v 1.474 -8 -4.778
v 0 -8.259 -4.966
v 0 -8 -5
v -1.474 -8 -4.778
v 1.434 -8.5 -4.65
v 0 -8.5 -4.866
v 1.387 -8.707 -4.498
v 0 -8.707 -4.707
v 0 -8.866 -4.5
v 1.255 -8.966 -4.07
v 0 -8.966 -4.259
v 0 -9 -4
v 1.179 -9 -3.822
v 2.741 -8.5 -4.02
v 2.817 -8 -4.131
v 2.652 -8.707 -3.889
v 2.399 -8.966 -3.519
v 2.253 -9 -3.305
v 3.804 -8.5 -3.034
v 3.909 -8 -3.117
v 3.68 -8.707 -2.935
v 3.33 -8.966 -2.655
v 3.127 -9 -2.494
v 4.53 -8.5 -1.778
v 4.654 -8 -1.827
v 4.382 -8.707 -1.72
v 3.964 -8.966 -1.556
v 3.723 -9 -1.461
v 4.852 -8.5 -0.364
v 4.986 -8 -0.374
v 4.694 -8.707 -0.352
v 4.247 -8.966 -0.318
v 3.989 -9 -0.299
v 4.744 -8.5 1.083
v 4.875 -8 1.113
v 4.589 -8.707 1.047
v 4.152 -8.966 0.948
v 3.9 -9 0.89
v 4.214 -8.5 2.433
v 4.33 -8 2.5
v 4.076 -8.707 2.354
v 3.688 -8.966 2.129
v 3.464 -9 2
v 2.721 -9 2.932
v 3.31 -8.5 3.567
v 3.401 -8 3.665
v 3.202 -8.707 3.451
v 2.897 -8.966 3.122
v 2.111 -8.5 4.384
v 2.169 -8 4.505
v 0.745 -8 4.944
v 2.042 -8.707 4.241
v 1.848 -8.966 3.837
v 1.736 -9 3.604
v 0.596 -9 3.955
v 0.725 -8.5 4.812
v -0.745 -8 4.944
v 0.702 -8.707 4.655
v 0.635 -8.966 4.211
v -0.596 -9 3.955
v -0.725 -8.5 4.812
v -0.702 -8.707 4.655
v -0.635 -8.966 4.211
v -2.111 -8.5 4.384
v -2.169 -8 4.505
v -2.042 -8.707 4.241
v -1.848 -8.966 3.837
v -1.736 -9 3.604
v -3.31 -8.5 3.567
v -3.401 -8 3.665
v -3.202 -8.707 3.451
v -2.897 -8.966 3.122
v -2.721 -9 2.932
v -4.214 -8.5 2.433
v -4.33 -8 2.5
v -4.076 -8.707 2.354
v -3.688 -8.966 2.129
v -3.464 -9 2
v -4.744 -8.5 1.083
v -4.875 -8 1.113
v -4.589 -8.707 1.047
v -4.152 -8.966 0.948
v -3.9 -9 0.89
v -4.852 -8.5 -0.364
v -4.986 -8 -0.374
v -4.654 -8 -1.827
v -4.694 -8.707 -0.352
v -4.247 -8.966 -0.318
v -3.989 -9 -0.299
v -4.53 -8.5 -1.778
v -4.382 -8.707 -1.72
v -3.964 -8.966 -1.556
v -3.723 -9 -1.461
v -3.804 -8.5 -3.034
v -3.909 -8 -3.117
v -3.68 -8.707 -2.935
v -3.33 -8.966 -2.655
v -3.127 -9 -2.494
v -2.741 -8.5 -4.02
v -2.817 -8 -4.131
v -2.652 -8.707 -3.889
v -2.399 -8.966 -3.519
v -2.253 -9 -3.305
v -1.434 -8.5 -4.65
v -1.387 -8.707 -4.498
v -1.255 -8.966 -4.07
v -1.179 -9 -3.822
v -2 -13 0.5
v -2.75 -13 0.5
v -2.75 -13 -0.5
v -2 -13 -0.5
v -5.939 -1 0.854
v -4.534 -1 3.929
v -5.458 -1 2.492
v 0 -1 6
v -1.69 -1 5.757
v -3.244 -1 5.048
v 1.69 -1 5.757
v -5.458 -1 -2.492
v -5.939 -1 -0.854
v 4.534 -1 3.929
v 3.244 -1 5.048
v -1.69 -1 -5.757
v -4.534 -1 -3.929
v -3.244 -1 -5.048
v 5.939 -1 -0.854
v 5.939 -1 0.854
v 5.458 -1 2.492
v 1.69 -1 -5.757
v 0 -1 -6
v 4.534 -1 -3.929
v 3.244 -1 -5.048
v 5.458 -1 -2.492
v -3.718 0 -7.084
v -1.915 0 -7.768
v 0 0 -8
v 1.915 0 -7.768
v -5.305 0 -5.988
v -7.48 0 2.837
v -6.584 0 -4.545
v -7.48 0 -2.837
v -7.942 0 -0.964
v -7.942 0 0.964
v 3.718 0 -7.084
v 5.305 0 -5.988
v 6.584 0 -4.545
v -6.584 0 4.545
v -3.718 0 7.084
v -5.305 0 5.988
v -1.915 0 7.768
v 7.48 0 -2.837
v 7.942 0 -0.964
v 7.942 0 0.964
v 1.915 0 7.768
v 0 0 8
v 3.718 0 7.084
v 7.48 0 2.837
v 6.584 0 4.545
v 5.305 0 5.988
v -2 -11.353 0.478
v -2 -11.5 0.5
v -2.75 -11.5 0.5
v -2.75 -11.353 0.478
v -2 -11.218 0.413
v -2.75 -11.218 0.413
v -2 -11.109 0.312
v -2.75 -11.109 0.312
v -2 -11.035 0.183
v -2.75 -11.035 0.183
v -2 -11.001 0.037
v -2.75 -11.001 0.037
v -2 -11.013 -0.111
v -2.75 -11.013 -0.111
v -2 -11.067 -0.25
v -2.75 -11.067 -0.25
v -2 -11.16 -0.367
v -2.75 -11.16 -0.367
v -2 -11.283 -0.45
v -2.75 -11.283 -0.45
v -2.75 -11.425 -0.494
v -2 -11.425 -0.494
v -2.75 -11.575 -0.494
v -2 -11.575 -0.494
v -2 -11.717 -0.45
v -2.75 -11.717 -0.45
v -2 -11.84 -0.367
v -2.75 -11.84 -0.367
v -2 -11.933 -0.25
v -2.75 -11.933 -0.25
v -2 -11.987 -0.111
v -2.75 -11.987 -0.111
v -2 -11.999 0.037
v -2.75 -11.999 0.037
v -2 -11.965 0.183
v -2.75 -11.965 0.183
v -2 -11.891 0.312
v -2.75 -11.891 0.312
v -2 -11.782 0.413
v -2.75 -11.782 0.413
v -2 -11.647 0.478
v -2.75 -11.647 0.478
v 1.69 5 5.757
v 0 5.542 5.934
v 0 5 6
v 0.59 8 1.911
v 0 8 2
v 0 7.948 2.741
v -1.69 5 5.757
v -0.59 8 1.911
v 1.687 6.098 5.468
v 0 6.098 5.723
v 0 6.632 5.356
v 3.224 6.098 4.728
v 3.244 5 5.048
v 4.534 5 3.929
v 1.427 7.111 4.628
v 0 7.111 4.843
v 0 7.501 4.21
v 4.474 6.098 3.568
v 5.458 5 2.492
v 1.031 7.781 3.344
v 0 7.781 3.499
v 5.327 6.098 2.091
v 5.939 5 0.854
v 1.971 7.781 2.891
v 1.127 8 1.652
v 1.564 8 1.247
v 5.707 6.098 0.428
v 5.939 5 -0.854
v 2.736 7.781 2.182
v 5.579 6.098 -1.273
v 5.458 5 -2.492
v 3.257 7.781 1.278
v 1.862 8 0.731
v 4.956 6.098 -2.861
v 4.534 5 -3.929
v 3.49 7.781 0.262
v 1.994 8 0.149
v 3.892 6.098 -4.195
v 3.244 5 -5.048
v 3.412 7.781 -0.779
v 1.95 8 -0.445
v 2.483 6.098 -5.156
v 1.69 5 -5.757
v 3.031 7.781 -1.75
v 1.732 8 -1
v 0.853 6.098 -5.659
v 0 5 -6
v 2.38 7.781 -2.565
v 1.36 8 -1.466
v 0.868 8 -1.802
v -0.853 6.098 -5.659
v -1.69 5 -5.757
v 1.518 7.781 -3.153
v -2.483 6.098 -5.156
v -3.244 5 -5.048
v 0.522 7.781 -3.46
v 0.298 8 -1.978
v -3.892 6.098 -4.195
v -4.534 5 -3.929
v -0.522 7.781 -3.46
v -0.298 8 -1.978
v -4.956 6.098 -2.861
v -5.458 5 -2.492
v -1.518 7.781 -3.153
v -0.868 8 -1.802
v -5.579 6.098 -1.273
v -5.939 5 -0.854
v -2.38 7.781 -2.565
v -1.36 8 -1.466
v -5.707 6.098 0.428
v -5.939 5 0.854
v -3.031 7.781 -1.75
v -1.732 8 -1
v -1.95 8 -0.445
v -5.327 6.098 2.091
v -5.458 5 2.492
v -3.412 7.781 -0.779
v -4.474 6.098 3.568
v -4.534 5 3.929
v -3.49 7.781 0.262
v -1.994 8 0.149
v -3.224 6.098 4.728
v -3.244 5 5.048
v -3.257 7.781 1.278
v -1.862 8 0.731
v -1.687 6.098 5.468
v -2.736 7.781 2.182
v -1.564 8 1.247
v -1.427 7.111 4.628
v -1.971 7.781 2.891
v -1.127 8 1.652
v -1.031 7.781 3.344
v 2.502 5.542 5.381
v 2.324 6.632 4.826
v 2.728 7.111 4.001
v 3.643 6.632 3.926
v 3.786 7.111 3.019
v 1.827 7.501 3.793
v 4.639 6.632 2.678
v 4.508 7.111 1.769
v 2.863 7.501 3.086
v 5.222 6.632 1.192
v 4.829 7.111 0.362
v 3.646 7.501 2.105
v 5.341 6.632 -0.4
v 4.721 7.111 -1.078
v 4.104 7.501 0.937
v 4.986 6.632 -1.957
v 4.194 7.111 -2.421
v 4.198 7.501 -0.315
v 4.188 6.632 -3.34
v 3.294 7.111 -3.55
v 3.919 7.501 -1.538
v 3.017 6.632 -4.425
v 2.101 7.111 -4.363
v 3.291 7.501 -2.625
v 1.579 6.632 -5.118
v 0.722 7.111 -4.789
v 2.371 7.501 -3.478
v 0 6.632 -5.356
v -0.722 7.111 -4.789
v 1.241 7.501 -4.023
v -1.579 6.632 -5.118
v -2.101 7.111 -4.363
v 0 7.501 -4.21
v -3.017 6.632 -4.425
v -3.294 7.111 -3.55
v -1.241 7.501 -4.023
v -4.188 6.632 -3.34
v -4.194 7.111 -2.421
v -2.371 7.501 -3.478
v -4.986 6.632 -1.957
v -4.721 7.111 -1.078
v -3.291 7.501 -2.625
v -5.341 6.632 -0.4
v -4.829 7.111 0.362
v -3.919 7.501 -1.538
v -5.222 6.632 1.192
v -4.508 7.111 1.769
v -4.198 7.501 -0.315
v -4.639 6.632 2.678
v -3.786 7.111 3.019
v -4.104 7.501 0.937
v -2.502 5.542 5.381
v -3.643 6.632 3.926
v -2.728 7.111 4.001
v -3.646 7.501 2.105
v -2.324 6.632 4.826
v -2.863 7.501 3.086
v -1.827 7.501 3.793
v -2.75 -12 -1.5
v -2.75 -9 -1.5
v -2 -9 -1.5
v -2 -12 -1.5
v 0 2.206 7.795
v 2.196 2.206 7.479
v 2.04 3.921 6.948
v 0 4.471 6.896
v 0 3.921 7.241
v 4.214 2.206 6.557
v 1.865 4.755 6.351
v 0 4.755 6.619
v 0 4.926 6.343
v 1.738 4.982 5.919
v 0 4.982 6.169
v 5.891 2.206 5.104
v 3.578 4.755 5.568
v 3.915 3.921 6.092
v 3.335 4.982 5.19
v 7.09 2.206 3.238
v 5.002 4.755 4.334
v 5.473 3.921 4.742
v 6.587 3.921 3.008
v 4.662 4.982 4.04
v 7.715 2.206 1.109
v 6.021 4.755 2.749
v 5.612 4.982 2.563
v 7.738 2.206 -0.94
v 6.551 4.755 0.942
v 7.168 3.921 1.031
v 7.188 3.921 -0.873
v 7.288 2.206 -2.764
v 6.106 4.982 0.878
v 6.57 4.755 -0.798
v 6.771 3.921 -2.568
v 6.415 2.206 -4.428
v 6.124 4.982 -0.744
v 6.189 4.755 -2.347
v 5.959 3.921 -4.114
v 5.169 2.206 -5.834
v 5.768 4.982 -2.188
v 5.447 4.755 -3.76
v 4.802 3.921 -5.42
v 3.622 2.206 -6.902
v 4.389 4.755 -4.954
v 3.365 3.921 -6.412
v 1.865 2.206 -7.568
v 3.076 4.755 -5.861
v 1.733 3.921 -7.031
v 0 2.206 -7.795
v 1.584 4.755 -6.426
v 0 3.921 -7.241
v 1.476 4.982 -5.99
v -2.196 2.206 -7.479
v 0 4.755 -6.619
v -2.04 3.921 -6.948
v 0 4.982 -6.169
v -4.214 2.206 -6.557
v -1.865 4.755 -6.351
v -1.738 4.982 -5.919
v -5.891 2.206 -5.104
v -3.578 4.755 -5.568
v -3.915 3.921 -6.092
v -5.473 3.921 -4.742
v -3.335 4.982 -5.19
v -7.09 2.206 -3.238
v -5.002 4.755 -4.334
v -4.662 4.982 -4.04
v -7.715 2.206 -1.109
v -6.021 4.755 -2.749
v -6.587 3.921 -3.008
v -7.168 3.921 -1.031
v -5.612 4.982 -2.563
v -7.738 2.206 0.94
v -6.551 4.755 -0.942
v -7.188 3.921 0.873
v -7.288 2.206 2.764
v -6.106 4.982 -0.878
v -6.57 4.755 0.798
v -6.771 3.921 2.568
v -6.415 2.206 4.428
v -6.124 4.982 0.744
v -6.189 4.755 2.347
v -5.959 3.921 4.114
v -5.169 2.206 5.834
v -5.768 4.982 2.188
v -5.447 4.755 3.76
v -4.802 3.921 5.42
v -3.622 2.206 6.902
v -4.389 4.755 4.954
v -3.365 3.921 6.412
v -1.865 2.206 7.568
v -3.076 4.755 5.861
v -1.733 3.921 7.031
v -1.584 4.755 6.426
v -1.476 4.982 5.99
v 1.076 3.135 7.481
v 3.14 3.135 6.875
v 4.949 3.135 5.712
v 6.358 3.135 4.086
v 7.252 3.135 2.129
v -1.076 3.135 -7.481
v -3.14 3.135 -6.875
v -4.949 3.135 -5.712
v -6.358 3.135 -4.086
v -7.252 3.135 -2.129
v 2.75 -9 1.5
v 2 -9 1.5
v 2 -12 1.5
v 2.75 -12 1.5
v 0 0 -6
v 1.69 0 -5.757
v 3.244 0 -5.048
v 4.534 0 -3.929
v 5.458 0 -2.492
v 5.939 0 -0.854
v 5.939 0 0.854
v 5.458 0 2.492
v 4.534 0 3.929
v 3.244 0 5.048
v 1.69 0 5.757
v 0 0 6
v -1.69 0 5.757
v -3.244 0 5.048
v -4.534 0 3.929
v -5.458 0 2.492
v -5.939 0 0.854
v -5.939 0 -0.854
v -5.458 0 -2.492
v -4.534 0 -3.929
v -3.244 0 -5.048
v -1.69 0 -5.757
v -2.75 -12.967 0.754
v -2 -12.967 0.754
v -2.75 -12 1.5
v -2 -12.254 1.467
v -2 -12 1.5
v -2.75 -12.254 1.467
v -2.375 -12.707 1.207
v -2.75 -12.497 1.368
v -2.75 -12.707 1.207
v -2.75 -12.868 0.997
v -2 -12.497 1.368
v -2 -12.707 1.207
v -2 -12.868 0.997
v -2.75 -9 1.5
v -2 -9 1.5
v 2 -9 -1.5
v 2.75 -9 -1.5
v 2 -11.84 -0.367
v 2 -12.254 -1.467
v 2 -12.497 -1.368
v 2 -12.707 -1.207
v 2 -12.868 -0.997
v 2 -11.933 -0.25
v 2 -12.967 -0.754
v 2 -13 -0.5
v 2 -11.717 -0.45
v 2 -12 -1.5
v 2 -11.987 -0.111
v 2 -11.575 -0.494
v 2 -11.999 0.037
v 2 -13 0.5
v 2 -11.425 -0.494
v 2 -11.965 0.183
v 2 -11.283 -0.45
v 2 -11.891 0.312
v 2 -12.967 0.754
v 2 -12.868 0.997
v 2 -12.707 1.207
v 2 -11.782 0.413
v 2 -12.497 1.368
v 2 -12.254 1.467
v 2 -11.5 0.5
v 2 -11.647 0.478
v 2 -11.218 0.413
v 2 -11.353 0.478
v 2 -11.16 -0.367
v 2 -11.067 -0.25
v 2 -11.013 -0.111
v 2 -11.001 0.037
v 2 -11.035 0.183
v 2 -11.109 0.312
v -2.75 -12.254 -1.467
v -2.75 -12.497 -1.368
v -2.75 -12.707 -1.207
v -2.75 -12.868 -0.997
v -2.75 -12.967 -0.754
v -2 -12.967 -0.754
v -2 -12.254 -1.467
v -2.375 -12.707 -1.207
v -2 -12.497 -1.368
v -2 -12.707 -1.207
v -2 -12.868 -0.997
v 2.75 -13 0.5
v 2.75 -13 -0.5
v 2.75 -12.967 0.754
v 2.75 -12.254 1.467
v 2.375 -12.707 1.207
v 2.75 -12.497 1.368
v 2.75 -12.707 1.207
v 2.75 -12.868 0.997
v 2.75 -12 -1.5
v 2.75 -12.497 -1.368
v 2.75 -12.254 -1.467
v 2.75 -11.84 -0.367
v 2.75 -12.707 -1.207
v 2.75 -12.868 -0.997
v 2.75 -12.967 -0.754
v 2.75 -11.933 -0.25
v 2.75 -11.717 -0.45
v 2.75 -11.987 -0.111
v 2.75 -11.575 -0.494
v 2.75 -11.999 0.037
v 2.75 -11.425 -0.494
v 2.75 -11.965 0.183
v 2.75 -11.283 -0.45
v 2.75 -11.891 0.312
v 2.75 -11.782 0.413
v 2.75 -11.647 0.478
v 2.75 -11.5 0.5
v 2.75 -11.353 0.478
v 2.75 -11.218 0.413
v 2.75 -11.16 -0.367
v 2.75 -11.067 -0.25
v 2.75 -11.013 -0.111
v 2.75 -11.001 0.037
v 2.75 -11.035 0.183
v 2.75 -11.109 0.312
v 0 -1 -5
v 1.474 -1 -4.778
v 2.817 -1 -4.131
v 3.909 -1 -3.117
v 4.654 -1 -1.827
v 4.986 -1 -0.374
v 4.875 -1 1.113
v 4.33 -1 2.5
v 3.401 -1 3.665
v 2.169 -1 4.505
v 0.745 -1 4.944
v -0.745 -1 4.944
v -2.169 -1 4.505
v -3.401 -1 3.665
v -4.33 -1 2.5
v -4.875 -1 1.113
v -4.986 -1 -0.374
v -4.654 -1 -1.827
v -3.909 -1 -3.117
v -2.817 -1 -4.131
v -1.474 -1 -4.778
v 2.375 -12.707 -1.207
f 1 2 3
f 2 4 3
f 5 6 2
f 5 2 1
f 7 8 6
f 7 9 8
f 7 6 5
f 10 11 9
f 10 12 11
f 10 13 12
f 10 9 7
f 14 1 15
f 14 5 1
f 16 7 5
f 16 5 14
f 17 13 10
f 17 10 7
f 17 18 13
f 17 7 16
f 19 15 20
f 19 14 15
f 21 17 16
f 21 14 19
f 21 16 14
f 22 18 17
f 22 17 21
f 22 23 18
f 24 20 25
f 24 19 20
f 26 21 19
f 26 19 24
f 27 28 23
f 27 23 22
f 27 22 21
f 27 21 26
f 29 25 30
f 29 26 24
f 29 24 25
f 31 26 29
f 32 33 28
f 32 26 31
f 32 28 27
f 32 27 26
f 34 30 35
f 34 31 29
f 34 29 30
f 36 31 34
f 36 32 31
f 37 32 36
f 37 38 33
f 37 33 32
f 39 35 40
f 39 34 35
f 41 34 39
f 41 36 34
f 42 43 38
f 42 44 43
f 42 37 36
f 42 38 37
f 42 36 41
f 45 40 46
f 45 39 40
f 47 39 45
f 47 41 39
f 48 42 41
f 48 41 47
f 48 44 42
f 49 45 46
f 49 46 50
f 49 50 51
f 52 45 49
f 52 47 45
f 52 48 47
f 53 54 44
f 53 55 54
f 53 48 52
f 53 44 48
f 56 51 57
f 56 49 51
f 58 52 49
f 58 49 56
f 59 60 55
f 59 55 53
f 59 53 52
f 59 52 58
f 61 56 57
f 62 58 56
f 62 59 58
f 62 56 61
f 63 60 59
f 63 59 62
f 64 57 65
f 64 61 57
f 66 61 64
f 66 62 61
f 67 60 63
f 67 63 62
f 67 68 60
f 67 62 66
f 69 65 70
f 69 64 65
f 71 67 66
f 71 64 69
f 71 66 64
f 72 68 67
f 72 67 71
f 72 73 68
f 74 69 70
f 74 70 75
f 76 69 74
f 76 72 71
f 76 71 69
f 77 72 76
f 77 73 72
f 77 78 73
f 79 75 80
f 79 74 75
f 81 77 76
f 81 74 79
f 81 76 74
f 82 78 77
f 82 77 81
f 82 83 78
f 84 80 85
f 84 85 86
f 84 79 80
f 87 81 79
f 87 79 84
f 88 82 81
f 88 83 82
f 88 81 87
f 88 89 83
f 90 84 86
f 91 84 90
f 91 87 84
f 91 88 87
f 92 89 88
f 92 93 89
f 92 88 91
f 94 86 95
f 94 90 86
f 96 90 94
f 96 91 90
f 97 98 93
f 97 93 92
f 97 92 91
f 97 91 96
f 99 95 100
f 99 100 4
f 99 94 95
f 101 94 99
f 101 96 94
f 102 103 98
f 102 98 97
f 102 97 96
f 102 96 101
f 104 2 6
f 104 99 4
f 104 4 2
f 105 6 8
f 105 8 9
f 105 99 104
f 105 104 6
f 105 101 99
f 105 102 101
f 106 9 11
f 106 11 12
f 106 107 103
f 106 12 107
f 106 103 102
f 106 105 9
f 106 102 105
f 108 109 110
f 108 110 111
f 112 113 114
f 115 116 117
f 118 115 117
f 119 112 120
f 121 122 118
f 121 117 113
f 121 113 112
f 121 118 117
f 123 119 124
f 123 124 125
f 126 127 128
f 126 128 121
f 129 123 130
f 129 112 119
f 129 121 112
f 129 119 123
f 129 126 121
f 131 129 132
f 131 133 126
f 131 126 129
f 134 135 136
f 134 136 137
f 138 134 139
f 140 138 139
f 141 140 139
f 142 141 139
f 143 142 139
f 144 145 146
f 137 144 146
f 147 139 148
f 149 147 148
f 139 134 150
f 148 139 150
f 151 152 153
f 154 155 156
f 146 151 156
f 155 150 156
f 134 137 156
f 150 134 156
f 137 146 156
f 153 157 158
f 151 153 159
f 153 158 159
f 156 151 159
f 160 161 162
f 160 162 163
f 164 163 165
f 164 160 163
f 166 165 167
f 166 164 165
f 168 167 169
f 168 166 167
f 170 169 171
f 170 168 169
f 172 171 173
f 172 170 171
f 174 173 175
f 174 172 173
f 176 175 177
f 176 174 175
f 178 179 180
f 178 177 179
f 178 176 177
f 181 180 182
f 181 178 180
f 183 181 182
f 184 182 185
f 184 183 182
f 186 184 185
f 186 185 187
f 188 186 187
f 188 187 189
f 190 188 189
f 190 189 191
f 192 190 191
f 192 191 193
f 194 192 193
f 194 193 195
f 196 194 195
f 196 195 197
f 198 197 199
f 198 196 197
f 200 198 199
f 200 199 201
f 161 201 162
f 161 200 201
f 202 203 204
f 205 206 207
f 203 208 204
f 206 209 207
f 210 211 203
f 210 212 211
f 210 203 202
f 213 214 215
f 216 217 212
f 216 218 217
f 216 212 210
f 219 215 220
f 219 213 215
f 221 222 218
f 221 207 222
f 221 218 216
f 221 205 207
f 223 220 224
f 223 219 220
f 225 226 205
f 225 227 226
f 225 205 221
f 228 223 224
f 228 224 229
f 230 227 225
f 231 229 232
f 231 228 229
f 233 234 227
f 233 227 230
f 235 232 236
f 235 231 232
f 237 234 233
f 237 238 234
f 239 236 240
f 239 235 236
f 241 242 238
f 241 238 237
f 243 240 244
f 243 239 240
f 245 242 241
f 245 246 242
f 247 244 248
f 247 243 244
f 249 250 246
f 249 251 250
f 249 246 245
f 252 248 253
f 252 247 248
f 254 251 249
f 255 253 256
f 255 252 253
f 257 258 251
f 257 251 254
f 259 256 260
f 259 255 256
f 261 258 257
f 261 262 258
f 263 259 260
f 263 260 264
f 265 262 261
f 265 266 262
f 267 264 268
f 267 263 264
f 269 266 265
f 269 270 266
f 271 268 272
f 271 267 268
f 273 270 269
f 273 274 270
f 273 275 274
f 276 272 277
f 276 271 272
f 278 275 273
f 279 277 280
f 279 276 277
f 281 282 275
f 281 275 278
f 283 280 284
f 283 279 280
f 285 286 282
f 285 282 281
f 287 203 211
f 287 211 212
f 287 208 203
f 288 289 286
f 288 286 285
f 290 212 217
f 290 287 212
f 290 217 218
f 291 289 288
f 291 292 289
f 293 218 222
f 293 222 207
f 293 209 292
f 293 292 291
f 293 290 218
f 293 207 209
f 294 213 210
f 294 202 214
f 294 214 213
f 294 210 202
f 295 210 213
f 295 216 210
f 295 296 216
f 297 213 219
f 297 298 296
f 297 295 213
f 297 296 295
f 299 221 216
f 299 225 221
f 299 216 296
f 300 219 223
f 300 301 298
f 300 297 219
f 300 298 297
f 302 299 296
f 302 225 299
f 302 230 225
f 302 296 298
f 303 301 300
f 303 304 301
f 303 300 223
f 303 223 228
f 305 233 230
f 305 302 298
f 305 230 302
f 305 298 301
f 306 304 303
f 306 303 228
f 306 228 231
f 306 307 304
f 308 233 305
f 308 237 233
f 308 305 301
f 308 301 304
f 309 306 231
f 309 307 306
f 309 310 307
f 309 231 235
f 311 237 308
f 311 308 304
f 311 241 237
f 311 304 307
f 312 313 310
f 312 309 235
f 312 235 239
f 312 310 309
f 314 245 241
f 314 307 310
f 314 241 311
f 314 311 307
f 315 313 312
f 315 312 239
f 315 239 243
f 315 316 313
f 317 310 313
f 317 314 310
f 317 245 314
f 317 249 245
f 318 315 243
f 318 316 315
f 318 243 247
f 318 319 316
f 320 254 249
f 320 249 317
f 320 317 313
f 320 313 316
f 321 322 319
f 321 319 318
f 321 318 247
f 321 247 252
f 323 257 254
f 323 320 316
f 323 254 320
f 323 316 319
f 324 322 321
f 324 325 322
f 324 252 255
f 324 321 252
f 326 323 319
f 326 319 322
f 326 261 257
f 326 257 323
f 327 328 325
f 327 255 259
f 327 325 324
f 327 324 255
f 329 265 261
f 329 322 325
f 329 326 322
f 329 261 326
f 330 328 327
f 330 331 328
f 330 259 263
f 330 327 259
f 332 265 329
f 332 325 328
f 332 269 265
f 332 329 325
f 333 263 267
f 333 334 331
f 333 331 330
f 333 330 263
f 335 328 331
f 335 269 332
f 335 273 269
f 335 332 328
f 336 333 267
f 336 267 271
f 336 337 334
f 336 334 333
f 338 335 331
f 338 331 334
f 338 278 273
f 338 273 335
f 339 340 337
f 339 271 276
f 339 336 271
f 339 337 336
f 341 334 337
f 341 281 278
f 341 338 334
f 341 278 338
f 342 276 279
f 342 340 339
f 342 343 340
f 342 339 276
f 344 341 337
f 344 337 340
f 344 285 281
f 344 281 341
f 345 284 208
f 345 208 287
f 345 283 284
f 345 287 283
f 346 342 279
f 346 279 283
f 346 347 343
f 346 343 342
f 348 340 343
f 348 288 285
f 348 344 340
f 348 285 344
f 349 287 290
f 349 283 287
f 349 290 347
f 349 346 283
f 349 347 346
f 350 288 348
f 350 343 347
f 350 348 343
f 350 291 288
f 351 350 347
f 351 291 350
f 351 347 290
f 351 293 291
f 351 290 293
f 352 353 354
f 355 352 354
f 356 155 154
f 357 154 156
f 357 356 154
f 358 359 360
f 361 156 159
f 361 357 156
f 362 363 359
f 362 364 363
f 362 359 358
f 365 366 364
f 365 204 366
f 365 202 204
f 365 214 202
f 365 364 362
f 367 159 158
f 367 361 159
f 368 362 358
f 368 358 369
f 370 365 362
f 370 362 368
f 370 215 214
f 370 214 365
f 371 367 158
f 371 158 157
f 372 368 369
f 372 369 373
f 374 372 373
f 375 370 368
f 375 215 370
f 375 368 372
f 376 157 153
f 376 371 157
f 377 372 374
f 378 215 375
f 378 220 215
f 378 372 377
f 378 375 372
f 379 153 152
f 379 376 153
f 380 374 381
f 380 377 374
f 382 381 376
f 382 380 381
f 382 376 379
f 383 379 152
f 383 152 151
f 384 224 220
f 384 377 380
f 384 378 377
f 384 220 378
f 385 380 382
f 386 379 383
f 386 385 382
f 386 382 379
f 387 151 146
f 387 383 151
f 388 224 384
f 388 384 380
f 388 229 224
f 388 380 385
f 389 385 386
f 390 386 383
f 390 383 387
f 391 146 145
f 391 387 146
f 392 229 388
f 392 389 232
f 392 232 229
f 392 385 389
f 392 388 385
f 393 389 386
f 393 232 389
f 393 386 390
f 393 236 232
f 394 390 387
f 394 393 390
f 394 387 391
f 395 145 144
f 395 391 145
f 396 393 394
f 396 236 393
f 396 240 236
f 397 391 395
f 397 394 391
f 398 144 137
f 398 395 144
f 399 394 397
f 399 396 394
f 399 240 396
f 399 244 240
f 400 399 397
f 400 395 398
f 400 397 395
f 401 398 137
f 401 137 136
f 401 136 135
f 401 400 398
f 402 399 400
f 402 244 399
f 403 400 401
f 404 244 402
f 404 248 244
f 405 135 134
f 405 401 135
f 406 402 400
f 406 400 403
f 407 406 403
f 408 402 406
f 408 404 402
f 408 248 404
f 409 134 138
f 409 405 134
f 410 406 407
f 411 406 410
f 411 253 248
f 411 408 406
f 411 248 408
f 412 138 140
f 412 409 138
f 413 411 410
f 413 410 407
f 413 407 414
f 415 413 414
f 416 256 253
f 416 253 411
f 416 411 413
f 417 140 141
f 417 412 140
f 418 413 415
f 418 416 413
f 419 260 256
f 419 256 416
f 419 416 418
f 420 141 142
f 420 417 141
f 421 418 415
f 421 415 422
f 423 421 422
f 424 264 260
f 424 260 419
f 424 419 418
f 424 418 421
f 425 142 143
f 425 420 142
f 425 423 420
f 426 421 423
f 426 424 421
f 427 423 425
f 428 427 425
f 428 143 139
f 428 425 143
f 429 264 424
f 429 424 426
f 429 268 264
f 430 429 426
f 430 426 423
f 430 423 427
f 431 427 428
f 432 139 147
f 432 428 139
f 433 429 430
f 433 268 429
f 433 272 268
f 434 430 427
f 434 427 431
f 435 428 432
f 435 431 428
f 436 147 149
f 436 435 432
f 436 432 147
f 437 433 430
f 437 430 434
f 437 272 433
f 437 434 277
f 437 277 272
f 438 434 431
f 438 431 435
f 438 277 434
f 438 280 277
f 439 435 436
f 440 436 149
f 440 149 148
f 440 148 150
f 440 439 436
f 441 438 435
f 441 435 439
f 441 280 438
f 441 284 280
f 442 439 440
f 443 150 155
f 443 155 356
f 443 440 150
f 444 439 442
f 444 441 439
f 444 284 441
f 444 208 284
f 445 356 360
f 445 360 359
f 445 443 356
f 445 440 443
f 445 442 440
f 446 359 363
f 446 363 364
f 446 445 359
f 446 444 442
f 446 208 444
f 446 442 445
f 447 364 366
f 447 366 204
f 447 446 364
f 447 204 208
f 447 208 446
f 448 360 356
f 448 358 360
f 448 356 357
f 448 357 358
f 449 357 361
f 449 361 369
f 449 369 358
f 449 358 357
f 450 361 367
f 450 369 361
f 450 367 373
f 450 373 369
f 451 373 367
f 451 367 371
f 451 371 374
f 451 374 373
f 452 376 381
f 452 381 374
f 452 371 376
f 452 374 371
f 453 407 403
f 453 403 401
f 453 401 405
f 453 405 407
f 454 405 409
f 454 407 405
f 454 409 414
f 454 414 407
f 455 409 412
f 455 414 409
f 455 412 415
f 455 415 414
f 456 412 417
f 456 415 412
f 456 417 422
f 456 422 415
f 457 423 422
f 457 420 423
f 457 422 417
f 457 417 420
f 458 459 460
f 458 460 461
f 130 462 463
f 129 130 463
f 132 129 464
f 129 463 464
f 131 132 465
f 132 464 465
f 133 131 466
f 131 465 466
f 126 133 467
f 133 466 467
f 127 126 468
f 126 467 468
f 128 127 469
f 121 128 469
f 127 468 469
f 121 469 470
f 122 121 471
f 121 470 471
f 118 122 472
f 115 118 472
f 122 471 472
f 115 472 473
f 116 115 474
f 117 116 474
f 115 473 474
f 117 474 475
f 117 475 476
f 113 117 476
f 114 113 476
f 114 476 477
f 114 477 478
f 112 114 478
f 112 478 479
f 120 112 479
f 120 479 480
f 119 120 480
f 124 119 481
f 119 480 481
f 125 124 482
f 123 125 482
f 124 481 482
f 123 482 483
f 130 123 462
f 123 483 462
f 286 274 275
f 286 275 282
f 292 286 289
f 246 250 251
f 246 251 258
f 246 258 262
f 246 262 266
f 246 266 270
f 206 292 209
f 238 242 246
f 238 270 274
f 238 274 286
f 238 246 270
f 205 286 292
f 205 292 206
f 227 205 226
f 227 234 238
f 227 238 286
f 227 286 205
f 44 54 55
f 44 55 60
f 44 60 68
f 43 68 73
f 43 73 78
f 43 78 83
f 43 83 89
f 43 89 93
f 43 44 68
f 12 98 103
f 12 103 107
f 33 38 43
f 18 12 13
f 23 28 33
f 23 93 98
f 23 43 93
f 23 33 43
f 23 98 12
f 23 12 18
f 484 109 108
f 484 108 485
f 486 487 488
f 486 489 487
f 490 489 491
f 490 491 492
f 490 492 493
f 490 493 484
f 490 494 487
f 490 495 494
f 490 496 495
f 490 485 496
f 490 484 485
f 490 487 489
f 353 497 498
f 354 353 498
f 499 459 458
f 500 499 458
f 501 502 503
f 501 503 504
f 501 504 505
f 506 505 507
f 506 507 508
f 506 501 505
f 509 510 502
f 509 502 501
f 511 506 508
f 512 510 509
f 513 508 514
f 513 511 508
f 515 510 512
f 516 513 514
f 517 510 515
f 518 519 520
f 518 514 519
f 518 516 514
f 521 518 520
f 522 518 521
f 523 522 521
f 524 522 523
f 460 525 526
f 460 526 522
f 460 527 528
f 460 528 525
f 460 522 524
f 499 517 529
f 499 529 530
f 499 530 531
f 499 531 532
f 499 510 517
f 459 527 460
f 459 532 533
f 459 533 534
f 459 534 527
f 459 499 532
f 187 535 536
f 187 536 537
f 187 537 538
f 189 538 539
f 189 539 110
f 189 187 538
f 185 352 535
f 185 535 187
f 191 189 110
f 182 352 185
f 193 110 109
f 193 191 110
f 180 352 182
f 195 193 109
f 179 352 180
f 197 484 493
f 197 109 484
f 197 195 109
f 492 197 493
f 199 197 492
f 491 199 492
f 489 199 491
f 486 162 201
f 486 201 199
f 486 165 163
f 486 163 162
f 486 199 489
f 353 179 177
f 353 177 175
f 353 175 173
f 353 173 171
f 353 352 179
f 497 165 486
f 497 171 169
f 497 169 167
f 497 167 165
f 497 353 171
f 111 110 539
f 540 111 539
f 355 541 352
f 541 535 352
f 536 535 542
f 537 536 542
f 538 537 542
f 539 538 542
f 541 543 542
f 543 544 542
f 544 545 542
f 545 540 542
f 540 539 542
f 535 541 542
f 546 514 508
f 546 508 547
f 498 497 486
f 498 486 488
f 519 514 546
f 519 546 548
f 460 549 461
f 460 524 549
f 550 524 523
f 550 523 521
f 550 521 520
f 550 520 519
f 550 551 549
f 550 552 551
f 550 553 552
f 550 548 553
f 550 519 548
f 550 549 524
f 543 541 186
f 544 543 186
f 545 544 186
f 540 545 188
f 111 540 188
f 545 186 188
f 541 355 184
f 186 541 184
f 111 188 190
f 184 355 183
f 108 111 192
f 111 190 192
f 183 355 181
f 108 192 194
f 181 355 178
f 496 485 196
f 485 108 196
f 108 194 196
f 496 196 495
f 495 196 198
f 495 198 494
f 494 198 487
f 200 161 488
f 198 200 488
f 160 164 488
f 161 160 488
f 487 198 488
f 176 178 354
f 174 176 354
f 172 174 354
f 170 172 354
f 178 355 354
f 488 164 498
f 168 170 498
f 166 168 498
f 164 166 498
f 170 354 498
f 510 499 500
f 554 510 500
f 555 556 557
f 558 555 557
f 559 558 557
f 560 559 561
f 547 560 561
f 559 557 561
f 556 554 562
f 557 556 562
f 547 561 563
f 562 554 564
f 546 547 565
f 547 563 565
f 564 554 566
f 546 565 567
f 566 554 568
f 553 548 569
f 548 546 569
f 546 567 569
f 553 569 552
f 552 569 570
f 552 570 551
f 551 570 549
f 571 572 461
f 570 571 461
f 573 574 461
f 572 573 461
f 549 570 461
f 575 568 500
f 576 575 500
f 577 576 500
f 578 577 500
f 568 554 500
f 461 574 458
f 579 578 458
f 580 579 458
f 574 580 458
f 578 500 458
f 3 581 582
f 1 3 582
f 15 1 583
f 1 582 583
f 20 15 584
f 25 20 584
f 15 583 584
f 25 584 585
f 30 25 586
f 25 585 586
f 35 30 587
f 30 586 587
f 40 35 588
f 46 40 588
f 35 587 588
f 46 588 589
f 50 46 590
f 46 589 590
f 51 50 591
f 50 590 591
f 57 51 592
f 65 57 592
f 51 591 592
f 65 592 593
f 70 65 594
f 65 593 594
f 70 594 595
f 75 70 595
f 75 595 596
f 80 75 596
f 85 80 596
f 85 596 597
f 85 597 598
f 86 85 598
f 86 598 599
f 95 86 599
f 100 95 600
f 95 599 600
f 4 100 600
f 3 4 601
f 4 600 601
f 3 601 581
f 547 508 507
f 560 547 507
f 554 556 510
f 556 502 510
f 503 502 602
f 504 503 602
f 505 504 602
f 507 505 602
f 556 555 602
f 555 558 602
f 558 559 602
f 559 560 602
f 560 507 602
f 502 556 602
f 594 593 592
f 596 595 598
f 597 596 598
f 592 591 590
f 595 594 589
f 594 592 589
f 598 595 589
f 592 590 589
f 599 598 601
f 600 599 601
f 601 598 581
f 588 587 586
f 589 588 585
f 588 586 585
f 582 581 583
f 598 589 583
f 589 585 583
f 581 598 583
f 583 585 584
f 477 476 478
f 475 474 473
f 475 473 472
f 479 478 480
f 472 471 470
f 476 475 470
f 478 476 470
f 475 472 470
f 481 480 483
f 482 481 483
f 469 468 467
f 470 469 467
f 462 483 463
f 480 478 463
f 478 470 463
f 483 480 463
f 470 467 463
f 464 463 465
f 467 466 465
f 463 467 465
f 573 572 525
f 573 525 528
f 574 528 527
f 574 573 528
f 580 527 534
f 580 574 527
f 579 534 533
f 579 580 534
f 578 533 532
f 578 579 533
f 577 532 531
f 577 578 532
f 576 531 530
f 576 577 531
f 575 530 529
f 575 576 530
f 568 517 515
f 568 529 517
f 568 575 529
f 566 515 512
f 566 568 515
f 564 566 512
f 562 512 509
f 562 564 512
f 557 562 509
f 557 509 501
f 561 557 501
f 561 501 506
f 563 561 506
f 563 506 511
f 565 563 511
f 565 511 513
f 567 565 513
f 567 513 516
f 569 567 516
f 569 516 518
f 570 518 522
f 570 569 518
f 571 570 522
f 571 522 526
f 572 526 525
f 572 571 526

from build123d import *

# Parameters (mm, degrees)
SKETCH1_R             = 8
BOSS_EXTRUDE1_DEPTH   = 5
FILLET2_SIZE          = 5
FILLET2_SIZE_2        = 2
SKETCH2_R             = 6
BOSS_EXTRUDE2_DEPTH   = 3
FILLET3_SIZE          = 3
FILLET3_SIZE_2        = 4
SKETCH3_R             = 6
BOSS_EXTRUDE3_DEPTH   = 1
SKETCH4_R             = 5
BOSS_EXTRUDE4_DEPTH   = 8
FILLET4_R             = 1
SKETCH5_W             = 0.75
SKETCH5_H             = 3
BOSS_EXTRUDE5_DEPTH   = 4
BOSS_EXTRUDE5_2_DEPTH = 4
FILLET5_START         = -4
FILLET5_DEPTH         = 3
FILLET6_START         = 1
FILLET6_DEPTH         = 3
CUT_EXTRUDE1_START    = -10.75
SKETCH6_R             = 0.5
CUT_EXTRUDE1_DEPTH    = 16


with BuildPart() as part:
    # Sketch1 → Boss-Extrude1 (new body)
    with BuildSketch(Plane(origin=(0, 0, 0), x_dir=(1, 0, 0), z_dir=(0, 1, 0))):
        with Locations(Location((0, 0, 0), (0, 0, 270))):
            Circle(SKETCH1_R)
    extrude(amount=BOSS_EXTRUDE1_DEPTH)

    # Fillet2
    # a fillet whose section is not a circle: 5, 2 mm, written as the material it takes off along each edge
    with BuildSketch(Plane(origin=(0, 5, 0), x_dir=(0, 0, 1), z_dir=(-1, 0, 0))) as fillet2_piece_1:
        with BuildLine():
            Bezier((8, -FILLET2_SIZE), (8, 0), (8 - FILLET2_SIZE_2, 0), weights=[1, 0.707106781, 1])
            Line((8 - FILLET2_SIZE_2, 0), (8, 0))
            Line((8, 0), (8, -FILLET2_SIZE))
        make_face()
    revolve(axis=Axis((0, 5, 0), (0, 1, 0)), mode=Mode.SUBTRACT)

    # Sketch2 → Boss-Extrude2 (add)
    with BuildSketch(Plane(origin=(0, 5, 0), x_dir=(1, 0, 0), z_dir=(0, 1, 0))):
        with Locations(Location((0, 0, 0), (0, 0, 270))):
            Circle(SKETCH2_R)
    extrude(amount=BOSS_EXTRUDE2_DEPTH)

    # Fillet3
    # a fillet whose section is not a circle: 4, 3 mm, written as the material it takes off along each edge
    with BuildSketch(Plane(origin=(0, 8, 0), x_dir=(0, 0, 1), z_dir=(-1, 0, 0))) as fillet3_piece_1:
        with BuildLine():
            Bezier((6, -FILLET3_SIZE), (6, 0), (6 - FILLET3_SIZE_2, 0), weights=[1, 0.707106781, 1])
            Line((6 - FILLET3_SIZE_2, 0), (6, 0))
            Line((6, 0), (6, -FILLET3_SIZE))
        make_face()
    revolve(axis=Axis((0, 8, 0), (0, 1, 0)), mode=Mode.SUBTRACT)


with BuildPart() as body_2:
    # Sketch3 → Boss-Extrude3 (new body)
    with BuildSketch(Plane.XZ):
        with Locations(Location((0, 0, 0), (0, 0, 270))):
            Circle(SKETCH3_R)
    extrude(amount=BOSS_EXTRUDE3_DEPTH)


with BuildPart() as body_3:
    # Sketch4 → Boss-Extrude4 (new body)
    with BuildSketch(Plane.XZ.offset(1)):
        with Locations(Location((0, 0, 0), (0, 0, 270))):
            Circle(SKETCH4_R)
    extrude(amount=BOSS_EXTRUDE4_DEPTH)

    # Fillet4
    fillet4_edges = [body_3.edges().sort_by_distance(p)[0] for p in [
        (0, -9, 5),
    ]]
    fillet(fillet4_edges, radius=FILLET4_R)


with BuildPart() as body_4:
    # Sketch5 → Boss-Extrude5 (new body)
    with BuildSketch(Plane.XZ.offset(9)):
        with Locations((-2.375, 0)):
            Rectangle(SKETCH5_W, SKETCH5_H)
    extrude(amount=BOSS_EXTRUDE5_DEPTH)

    # Fillet5: read off the stored shape, not the designer's step
    # Fillet5 outline → Fillet5 (cut)
    with BuildSketch(Plane.YZ.offset(FILLET5_START)):
        with BuildLine():
            add(Edge.make_bspline(
                [(-13, -0.5), (-13, -1.5), (-12, -1.5)],
                knots=[0, 0, 0, 1, 1, 1], degree=2, weights=[1, 0.707106781, 1]))
            Line((-13, -0.5), (-13, -1.5))
            Line((-13, -1.5), (-12, -1.5))
        make_face()
        with BuildLine():
            Line((-13, 1.5), (-13, 0.5))
            add(Edge.make_bspline(
                [(-13, 0.5), (-13, 1.5), (-12, 1.5)],
                knots=[0, 0, 0, 1, 1, 1], degree=2, weights=[1, 0.707106781, 1]))
            Line((-12, 1.5), (-13, 1.5))
        make_face()
    extrude(amount=FILLET5_DEPTH, mode=Mode.SUBTRACT)


with BuildPart() as body_5:
    # Sketch5 → Boss-Extrude5 2 (new body)
    with BuildSketch(Plane.XZ.offset(9)):
        with Locations((2.375, 0)):
            Rectangle(SKETCH5_W, SKETCH5_H)
    extrude(amount=BOSS_EXTRUDE5_2_DEPTH)

    # Fillet6: read off the stored shape, not the designer's step
    # Fillet6 outline → Fillet6 (cut)
    with BuildSketch(Plane.YZ.offset(FILLET6_START)):
        with BuildLine():
            add(Edge.make_bspline(
                [(-13, -0.5), (-13, -1.5), (-12, -1.5)],
                knots=[0, 0, 0, 1, 1, 1], degree=2, weights=[1, 0.707106781, 1]))
            Line((-13, -0.5), (-13, -1.5))
            Line((-13, -1.5), (-12, -1.5))
        make_face()
        with BuildLine():
            Line((-13, 1.5), (-13, 0.5))
            add(Edge.make_bspline(
                [(-13, 0.5), (-13, 1.5), (-12, 1.5)],
                knots=[0, 0, 0, 1, 1, 1], degree=2, weights=[1, 0.707106781, 1]))
            Line((-12, 1.5), (-13, 1.5))
        make_face()
    extrude(amount=FILLET6_DEPTH, mode=Mode.SUBTRACT)


with BuildPart() as cut_extrude1_tool:
    # Sketch6 → Cut-Extrude1 (new body)
    with BuildSketch(Plane.ZY.offset(2.75).offset(CUT_EXTRUDE1_START)):
        with Locations((0, -11.5)):
            Circle(SKETCH6_R)
    extrude(amount=CUT_EXTRUDE1_DEPTH)


with BuildPart() as body_4_1:
    add(body_4.part)

    # Cut-Extrude1: cut by cut_extrude1_tool
    add(cut_extrude1_tool.part, mode=Mode.SUBTRACT)


with BuildPart() as body_5_1:
    add(body_5.part)

    # Cut-Extrude1: cut by cut_extrude1_tool
    add(cut_extrude1_tool.part, mode=Mode.SUBTRACT)


solid = Compound([part.part, body_2.part, body_3.part, body_4_1.part, body_5_1.part])
